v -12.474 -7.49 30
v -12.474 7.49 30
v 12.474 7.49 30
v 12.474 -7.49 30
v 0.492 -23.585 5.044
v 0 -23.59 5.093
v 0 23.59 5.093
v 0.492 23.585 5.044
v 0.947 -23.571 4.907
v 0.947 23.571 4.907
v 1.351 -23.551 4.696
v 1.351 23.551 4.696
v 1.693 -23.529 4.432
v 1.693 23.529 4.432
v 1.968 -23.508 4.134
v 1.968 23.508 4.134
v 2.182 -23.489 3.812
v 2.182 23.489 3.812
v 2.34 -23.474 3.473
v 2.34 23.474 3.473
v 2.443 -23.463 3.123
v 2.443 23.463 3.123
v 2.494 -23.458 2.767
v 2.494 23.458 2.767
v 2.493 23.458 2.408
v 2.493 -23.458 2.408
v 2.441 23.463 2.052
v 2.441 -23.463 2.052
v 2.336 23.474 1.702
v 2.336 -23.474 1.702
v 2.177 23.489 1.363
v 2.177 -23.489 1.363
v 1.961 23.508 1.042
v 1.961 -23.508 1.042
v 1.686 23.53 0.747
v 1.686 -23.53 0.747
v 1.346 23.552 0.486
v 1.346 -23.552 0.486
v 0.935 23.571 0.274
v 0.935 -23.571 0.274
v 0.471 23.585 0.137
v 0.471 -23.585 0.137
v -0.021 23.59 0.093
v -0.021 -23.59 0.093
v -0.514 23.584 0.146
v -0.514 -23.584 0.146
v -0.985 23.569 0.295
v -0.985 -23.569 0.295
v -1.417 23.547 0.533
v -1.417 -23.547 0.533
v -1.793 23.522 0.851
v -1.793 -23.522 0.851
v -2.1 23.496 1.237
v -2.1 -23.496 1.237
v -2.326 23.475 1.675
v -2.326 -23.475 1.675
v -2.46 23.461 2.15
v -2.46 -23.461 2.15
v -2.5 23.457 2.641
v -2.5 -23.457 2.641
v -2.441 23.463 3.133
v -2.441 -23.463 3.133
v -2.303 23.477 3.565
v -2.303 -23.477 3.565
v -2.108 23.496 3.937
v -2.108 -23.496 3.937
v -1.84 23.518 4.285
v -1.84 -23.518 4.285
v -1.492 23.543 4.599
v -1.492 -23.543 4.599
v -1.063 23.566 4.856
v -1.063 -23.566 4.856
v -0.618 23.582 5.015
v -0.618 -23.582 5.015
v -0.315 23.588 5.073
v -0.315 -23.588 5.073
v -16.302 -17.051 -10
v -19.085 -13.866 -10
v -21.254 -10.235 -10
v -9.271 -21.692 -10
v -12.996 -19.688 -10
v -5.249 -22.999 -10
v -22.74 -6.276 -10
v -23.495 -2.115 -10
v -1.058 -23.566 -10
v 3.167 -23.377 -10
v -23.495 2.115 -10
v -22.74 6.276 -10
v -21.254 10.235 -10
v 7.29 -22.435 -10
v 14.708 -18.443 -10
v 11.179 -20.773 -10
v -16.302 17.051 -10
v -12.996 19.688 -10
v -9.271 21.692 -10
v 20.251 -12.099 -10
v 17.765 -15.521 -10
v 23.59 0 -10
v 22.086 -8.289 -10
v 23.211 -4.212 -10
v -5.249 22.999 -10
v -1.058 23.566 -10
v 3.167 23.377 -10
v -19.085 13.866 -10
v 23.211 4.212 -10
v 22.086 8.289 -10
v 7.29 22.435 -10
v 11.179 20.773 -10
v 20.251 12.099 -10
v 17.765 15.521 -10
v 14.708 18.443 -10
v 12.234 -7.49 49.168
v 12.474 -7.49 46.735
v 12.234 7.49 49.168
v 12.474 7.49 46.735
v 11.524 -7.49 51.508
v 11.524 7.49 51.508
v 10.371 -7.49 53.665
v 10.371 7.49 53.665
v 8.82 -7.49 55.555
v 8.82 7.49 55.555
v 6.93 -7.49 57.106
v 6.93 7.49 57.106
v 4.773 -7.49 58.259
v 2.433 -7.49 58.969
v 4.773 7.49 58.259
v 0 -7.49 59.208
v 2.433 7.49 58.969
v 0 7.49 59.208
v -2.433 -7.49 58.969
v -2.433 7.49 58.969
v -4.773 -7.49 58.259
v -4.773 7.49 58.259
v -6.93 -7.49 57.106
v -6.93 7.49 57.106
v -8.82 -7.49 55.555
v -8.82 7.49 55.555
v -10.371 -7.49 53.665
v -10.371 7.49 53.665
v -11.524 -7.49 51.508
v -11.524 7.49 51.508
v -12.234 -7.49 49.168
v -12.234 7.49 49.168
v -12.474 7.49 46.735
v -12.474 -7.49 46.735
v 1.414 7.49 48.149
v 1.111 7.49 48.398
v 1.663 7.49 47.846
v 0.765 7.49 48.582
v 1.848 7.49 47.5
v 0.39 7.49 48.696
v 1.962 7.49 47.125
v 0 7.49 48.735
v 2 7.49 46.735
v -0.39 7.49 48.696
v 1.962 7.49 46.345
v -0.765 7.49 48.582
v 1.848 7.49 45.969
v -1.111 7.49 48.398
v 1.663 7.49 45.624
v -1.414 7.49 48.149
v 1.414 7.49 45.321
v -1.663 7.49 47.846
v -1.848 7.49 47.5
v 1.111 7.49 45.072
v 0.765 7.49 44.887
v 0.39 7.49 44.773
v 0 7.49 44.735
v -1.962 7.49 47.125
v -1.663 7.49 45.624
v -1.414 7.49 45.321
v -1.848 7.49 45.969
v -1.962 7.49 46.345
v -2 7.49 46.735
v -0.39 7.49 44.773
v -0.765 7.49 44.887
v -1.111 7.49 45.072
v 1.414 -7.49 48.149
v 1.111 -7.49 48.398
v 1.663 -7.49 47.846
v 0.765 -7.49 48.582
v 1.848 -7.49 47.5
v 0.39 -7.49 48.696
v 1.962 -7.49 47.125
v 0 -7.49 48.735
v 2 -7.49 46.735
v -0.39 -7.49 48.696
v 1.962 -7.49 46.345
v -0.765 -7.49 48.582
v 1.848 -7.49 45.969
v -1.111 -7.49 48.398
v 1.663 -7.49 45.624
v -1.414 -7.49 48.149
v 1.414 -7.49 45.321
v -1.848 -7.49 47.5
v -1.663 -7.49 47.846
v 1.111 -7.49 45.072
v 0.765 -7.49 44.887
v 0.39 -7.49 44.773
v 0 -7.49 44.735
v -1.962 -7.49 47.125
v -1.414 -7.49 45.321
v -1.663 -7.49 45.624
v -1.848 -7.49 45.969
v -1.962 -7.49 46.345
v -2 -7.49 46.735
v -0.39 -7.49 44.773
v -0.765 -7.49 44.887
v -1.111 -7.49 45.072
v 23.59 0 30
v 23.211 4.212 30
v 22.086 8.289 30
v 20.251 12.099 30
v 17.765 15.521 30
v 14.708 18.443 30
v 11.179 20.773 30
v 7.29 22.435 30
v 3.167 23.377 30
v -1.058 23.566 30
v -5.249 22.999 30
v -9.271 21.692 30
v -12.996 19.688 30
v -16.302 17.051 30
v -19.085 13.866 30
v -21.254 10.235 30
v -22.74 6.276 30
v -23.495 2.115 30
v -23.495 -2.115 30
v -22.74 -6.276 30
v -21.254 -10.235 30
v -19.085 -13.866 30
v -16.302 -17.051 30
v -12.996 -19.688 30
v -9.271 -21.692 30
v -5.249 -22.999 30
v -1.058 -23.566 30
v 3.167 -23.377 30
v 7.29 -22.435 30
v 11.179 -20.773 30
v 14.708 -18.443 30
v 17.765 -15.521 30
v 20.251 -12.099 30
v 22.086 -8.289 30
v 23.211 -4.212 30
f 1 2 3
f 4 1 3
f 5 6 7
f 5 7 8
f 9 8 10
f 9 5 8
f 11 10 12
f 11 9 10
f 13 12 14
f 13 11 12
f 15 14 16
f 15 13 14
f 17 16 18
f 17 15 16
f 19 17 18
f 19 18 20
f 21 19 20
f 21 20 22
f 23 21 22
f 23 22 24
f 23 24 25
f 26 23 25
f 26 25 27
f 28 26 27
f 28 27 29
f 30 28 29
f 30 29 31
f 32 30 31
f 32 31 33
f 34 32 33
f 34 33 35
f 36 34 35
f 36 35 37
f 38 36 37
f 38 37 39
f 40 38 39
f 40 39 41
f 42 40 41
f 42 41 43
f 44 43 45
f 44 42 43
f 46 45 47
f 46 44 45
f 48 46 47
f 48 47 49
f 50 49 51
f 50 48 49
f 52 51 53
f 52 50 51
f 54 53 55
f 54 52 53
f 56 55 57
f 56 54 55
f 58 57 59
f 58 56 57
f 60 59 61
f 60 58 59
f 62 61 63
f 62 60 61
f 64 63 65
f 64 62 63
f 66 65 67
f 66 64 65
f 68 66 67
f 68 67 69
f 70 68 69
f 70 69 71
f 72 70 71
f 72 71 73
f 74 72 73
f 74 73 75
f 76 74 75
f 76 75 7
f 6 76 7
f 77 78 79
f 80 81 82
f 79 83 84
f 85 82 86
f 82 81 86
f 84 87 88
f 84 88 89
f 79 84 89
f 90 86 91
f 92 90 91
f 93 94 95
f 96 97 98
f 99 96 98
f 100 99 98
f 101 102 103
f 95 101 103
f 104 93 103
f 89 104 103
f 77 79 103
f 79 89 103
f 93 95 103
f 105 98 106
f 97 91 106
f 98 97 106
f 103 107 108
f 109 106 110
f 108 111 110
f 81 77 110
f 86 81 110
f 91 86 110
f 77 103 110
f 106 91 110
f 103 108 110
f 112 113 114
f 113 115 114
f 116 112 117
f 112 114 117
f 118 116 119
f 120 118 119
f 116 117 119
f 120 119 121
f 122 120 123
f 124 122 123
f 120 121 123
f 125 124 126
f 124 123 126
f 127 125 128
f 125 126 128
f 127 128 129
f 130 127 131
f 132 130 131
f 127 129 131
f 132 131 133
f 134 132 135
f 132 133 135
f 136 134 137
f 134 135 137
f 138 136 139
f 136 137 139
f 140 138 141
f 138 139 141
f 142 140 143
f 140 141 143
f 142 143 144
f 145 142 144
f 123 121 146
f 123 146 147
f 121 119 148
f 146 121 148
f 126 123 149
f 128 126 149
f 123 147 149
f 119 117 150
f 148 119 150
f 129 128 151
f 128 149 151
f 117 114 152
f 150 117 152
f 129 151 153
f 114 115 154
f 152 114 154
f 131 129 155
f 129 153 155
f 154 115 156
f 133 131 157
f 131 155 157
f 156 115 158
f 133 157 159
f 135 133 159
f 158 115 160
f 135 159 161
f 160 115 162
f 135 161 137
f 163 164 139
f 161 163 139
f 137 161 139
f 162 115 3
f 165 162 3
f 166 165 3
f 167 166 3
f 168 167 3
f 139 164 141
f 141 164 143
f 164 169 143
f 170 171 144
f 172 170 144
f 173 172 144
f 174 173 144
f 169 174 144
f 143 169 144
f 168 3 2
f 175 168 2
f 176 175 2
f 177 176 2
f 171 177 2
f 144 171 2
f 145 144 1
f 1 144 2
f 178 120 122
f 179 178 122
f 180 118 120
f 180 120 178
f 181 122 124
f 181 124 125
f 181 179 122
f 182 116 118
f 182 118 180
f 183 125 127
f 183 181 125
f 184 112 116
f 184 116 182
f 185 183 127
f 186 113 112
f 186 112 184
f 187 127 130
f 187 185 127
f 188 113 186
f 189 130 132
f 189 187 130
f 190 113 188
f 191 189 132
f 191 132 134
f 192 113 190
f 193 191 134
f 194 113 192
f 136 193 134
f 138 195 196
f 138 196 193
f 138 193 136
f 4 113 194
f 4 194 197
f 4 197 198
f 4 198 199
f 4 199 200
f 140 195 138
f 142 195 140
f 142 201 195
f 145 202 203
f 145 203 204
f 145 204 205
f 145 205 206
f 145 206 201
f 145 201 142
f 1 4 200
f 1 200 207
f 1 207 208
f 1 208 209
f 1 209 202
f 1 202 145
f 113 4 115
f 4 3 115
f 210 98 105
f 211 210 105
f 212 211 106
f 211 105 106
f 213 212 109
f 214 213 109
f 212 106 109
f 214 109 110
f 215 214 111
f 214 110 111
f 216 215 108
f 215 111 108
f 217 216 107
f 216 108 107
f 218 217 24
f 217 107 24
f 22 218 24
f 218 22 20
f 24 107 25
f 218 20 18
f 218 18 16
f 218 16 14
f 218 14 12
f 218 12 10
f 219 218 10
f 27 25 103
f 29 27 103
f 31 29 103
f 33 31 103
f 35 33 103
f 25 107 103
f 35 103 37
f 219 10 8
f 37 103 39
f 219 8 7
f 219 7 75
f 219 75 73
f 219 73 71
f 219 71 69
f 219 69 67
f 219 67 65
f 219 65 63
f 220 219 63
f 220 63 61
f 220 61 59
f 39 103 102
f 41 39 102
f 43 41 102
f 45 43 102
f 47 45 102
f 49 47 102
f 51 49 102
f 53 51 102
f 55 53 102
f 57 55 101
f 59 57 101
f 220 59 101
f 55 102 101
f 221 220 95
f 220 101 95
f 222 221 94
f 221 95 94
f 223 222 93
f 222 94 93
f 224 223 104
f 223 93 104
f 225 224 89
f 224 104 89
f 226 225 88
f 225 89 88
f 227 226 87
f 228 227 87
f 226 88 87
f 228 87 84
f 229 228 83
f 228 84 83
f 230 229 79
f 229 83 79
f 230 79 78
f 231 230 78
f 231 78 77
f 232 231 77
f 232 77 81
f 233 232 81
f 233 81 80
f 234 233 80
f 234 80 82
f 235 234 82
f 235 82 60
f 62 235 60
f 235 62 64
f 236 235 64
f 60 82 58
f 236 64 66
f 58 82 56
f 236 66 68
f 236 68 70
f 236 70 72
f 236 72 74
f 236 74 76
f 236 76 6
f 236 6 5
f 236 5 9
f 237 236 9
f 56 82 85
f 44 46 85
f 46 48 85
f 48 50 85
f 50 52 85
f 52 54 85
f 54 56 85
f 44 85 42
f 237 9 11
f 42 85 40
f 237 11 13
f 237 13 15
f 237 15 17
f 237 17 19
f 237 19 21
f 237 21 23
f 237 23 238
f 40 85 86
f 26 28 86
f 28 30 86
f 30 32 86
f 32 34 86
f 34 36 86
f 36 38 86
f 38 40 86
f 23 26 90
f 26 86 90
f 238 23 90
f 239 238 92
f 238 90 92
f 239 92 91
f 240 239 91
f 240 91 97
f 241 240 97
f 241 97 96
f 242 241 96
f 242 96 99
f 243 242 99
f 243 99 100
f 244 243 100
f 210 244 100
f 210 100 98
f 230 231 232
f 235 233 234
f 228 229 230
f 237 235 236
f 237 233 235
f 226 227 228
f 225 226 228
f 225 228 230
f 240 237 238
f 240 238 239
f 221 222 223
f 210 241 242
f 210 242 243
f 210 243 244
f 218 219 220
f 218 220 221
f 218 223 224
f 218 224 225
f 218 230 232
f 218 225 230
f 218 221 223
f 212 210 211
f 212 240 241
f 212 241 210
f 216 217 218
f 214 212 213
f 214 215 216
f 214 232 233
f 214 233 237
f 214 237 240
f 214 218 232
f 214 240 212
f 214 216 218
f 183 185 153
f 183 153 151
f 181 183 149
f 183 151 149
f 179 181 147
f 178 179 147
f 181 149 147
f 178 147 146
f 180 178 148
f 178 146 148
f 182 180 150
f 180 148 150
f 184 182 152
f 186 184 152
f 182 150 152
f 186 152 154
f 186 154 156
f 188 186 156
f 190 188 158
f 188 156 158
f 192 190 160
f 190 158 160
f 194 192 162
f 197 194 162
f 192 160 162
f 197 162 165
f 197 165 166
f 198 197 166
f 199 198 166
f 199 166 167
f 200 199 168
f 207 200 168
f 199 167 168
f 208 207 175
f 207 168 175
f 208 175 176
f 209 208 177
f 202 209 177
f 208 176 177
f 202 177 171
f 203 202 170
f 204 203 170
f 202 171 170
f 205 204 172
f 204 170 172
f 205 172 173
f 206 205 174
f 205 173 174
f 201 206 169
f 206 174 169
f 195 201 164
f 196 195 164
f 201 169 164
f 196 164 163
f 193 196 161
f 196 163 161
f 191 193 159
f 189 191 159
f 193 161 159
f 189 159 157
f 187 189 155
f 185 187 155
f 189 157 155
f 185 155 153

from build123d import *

# Parameters (mm, degrees)
RESSALTO_EXTRUS_O1_DEPTH      = 30
RESSALTO_EXTRUS_O1_DEPTH_BACK = 10
ESBO_O1_R                     = 23.59
RESSALTO_EXTRUS_O2_DEPTH      = 7.49
ESBO_O3_R                     = 2
CORTE_EXTRUS_O1_DEPTH         = 37.5
CUT_EXTRUDE1_DEPTH            = 68.960216691
CUT_EXTRUDE1_DEPTH_BACK       = 68.960216691
SKETCH1_R                     = 2.5


with BuildPart() as part:
    # Esboço1 → Ressalto-extrusão1 (new, two sides: drawn at the far end of the back side and taken through both)
    with BuildSketch(Plane.XY.offset(-RESSALTO_EXTRUS_O1_DEPTH_BACK)):
        Circle(ESBO_O1_R)
    extrude(amount=RESSALTO_EXTRUS_O1_DEPTH + RESSALTO_EXTRUS_O1_DEPTH_BACK)

    # Sketch1 → Cut-Extrude1 (cut, two sides: drawn at the far end of the back side and taken through both)
    with BuildSketch(Plane(origin=(0, 0, 0), x_dir=(1, 0, 0), z_dir=(0, 1, 0)).offset(-CUT_EXTRUDE1_DEPTH_BACK)):
        with Locations(Location((0, -2.59265528, 0), (0, 0, 270))):
            Circle(SKETCH1_R)
    extrude(amount=CUT_EXTRUDE1_DEPTH + CUT_EXTRUDE1_DEPTH_BACK, mode=Mode.SUBTRACT)


with BuildPart() as body_2:
    # Esboço2 → Ressalto-extrusão2 (new, symmetric)
    with BuildSketch(Plane(origin=(0, 0, 0), x_dir=(1, 0, 0), z_dir=(0, 1, 0))):
        with BuildLine():
            Line((-12.473507345, -30), (12.473507345, -30))
            Line((12.473507345, -30), (12.473507345, -46.734725635))
            ThreePointArc((12.473507345, -46.734725635), (0, -59.20823298), (-12.473507345, -46.734725635))
            Line((-12.473507345, -46.734725635), (-12.473507345, -30))
        make_face()
    extrude(amount=RESSALTO_EXTRUS_O2_DEPTH, both=True)

    # Esboço3 → Corte-extrusão1 (cut, symmetric)
    with BuildSketch(Plane(origin=(0, 7.49, 0), x_dir=(1, 0, 0), z_dir=(0, 1, 0))):
        with Locations(Location((0, -46.734725635, 0), (0, 0, 270))):
            Circle(ESBO_O3_R)
    extrude(amount=CORTE_EXTRUS_O1_DEPTH, both=True, mode=Mode.SUBTRACT)


solid = Compound([part.part, body_2.part])
